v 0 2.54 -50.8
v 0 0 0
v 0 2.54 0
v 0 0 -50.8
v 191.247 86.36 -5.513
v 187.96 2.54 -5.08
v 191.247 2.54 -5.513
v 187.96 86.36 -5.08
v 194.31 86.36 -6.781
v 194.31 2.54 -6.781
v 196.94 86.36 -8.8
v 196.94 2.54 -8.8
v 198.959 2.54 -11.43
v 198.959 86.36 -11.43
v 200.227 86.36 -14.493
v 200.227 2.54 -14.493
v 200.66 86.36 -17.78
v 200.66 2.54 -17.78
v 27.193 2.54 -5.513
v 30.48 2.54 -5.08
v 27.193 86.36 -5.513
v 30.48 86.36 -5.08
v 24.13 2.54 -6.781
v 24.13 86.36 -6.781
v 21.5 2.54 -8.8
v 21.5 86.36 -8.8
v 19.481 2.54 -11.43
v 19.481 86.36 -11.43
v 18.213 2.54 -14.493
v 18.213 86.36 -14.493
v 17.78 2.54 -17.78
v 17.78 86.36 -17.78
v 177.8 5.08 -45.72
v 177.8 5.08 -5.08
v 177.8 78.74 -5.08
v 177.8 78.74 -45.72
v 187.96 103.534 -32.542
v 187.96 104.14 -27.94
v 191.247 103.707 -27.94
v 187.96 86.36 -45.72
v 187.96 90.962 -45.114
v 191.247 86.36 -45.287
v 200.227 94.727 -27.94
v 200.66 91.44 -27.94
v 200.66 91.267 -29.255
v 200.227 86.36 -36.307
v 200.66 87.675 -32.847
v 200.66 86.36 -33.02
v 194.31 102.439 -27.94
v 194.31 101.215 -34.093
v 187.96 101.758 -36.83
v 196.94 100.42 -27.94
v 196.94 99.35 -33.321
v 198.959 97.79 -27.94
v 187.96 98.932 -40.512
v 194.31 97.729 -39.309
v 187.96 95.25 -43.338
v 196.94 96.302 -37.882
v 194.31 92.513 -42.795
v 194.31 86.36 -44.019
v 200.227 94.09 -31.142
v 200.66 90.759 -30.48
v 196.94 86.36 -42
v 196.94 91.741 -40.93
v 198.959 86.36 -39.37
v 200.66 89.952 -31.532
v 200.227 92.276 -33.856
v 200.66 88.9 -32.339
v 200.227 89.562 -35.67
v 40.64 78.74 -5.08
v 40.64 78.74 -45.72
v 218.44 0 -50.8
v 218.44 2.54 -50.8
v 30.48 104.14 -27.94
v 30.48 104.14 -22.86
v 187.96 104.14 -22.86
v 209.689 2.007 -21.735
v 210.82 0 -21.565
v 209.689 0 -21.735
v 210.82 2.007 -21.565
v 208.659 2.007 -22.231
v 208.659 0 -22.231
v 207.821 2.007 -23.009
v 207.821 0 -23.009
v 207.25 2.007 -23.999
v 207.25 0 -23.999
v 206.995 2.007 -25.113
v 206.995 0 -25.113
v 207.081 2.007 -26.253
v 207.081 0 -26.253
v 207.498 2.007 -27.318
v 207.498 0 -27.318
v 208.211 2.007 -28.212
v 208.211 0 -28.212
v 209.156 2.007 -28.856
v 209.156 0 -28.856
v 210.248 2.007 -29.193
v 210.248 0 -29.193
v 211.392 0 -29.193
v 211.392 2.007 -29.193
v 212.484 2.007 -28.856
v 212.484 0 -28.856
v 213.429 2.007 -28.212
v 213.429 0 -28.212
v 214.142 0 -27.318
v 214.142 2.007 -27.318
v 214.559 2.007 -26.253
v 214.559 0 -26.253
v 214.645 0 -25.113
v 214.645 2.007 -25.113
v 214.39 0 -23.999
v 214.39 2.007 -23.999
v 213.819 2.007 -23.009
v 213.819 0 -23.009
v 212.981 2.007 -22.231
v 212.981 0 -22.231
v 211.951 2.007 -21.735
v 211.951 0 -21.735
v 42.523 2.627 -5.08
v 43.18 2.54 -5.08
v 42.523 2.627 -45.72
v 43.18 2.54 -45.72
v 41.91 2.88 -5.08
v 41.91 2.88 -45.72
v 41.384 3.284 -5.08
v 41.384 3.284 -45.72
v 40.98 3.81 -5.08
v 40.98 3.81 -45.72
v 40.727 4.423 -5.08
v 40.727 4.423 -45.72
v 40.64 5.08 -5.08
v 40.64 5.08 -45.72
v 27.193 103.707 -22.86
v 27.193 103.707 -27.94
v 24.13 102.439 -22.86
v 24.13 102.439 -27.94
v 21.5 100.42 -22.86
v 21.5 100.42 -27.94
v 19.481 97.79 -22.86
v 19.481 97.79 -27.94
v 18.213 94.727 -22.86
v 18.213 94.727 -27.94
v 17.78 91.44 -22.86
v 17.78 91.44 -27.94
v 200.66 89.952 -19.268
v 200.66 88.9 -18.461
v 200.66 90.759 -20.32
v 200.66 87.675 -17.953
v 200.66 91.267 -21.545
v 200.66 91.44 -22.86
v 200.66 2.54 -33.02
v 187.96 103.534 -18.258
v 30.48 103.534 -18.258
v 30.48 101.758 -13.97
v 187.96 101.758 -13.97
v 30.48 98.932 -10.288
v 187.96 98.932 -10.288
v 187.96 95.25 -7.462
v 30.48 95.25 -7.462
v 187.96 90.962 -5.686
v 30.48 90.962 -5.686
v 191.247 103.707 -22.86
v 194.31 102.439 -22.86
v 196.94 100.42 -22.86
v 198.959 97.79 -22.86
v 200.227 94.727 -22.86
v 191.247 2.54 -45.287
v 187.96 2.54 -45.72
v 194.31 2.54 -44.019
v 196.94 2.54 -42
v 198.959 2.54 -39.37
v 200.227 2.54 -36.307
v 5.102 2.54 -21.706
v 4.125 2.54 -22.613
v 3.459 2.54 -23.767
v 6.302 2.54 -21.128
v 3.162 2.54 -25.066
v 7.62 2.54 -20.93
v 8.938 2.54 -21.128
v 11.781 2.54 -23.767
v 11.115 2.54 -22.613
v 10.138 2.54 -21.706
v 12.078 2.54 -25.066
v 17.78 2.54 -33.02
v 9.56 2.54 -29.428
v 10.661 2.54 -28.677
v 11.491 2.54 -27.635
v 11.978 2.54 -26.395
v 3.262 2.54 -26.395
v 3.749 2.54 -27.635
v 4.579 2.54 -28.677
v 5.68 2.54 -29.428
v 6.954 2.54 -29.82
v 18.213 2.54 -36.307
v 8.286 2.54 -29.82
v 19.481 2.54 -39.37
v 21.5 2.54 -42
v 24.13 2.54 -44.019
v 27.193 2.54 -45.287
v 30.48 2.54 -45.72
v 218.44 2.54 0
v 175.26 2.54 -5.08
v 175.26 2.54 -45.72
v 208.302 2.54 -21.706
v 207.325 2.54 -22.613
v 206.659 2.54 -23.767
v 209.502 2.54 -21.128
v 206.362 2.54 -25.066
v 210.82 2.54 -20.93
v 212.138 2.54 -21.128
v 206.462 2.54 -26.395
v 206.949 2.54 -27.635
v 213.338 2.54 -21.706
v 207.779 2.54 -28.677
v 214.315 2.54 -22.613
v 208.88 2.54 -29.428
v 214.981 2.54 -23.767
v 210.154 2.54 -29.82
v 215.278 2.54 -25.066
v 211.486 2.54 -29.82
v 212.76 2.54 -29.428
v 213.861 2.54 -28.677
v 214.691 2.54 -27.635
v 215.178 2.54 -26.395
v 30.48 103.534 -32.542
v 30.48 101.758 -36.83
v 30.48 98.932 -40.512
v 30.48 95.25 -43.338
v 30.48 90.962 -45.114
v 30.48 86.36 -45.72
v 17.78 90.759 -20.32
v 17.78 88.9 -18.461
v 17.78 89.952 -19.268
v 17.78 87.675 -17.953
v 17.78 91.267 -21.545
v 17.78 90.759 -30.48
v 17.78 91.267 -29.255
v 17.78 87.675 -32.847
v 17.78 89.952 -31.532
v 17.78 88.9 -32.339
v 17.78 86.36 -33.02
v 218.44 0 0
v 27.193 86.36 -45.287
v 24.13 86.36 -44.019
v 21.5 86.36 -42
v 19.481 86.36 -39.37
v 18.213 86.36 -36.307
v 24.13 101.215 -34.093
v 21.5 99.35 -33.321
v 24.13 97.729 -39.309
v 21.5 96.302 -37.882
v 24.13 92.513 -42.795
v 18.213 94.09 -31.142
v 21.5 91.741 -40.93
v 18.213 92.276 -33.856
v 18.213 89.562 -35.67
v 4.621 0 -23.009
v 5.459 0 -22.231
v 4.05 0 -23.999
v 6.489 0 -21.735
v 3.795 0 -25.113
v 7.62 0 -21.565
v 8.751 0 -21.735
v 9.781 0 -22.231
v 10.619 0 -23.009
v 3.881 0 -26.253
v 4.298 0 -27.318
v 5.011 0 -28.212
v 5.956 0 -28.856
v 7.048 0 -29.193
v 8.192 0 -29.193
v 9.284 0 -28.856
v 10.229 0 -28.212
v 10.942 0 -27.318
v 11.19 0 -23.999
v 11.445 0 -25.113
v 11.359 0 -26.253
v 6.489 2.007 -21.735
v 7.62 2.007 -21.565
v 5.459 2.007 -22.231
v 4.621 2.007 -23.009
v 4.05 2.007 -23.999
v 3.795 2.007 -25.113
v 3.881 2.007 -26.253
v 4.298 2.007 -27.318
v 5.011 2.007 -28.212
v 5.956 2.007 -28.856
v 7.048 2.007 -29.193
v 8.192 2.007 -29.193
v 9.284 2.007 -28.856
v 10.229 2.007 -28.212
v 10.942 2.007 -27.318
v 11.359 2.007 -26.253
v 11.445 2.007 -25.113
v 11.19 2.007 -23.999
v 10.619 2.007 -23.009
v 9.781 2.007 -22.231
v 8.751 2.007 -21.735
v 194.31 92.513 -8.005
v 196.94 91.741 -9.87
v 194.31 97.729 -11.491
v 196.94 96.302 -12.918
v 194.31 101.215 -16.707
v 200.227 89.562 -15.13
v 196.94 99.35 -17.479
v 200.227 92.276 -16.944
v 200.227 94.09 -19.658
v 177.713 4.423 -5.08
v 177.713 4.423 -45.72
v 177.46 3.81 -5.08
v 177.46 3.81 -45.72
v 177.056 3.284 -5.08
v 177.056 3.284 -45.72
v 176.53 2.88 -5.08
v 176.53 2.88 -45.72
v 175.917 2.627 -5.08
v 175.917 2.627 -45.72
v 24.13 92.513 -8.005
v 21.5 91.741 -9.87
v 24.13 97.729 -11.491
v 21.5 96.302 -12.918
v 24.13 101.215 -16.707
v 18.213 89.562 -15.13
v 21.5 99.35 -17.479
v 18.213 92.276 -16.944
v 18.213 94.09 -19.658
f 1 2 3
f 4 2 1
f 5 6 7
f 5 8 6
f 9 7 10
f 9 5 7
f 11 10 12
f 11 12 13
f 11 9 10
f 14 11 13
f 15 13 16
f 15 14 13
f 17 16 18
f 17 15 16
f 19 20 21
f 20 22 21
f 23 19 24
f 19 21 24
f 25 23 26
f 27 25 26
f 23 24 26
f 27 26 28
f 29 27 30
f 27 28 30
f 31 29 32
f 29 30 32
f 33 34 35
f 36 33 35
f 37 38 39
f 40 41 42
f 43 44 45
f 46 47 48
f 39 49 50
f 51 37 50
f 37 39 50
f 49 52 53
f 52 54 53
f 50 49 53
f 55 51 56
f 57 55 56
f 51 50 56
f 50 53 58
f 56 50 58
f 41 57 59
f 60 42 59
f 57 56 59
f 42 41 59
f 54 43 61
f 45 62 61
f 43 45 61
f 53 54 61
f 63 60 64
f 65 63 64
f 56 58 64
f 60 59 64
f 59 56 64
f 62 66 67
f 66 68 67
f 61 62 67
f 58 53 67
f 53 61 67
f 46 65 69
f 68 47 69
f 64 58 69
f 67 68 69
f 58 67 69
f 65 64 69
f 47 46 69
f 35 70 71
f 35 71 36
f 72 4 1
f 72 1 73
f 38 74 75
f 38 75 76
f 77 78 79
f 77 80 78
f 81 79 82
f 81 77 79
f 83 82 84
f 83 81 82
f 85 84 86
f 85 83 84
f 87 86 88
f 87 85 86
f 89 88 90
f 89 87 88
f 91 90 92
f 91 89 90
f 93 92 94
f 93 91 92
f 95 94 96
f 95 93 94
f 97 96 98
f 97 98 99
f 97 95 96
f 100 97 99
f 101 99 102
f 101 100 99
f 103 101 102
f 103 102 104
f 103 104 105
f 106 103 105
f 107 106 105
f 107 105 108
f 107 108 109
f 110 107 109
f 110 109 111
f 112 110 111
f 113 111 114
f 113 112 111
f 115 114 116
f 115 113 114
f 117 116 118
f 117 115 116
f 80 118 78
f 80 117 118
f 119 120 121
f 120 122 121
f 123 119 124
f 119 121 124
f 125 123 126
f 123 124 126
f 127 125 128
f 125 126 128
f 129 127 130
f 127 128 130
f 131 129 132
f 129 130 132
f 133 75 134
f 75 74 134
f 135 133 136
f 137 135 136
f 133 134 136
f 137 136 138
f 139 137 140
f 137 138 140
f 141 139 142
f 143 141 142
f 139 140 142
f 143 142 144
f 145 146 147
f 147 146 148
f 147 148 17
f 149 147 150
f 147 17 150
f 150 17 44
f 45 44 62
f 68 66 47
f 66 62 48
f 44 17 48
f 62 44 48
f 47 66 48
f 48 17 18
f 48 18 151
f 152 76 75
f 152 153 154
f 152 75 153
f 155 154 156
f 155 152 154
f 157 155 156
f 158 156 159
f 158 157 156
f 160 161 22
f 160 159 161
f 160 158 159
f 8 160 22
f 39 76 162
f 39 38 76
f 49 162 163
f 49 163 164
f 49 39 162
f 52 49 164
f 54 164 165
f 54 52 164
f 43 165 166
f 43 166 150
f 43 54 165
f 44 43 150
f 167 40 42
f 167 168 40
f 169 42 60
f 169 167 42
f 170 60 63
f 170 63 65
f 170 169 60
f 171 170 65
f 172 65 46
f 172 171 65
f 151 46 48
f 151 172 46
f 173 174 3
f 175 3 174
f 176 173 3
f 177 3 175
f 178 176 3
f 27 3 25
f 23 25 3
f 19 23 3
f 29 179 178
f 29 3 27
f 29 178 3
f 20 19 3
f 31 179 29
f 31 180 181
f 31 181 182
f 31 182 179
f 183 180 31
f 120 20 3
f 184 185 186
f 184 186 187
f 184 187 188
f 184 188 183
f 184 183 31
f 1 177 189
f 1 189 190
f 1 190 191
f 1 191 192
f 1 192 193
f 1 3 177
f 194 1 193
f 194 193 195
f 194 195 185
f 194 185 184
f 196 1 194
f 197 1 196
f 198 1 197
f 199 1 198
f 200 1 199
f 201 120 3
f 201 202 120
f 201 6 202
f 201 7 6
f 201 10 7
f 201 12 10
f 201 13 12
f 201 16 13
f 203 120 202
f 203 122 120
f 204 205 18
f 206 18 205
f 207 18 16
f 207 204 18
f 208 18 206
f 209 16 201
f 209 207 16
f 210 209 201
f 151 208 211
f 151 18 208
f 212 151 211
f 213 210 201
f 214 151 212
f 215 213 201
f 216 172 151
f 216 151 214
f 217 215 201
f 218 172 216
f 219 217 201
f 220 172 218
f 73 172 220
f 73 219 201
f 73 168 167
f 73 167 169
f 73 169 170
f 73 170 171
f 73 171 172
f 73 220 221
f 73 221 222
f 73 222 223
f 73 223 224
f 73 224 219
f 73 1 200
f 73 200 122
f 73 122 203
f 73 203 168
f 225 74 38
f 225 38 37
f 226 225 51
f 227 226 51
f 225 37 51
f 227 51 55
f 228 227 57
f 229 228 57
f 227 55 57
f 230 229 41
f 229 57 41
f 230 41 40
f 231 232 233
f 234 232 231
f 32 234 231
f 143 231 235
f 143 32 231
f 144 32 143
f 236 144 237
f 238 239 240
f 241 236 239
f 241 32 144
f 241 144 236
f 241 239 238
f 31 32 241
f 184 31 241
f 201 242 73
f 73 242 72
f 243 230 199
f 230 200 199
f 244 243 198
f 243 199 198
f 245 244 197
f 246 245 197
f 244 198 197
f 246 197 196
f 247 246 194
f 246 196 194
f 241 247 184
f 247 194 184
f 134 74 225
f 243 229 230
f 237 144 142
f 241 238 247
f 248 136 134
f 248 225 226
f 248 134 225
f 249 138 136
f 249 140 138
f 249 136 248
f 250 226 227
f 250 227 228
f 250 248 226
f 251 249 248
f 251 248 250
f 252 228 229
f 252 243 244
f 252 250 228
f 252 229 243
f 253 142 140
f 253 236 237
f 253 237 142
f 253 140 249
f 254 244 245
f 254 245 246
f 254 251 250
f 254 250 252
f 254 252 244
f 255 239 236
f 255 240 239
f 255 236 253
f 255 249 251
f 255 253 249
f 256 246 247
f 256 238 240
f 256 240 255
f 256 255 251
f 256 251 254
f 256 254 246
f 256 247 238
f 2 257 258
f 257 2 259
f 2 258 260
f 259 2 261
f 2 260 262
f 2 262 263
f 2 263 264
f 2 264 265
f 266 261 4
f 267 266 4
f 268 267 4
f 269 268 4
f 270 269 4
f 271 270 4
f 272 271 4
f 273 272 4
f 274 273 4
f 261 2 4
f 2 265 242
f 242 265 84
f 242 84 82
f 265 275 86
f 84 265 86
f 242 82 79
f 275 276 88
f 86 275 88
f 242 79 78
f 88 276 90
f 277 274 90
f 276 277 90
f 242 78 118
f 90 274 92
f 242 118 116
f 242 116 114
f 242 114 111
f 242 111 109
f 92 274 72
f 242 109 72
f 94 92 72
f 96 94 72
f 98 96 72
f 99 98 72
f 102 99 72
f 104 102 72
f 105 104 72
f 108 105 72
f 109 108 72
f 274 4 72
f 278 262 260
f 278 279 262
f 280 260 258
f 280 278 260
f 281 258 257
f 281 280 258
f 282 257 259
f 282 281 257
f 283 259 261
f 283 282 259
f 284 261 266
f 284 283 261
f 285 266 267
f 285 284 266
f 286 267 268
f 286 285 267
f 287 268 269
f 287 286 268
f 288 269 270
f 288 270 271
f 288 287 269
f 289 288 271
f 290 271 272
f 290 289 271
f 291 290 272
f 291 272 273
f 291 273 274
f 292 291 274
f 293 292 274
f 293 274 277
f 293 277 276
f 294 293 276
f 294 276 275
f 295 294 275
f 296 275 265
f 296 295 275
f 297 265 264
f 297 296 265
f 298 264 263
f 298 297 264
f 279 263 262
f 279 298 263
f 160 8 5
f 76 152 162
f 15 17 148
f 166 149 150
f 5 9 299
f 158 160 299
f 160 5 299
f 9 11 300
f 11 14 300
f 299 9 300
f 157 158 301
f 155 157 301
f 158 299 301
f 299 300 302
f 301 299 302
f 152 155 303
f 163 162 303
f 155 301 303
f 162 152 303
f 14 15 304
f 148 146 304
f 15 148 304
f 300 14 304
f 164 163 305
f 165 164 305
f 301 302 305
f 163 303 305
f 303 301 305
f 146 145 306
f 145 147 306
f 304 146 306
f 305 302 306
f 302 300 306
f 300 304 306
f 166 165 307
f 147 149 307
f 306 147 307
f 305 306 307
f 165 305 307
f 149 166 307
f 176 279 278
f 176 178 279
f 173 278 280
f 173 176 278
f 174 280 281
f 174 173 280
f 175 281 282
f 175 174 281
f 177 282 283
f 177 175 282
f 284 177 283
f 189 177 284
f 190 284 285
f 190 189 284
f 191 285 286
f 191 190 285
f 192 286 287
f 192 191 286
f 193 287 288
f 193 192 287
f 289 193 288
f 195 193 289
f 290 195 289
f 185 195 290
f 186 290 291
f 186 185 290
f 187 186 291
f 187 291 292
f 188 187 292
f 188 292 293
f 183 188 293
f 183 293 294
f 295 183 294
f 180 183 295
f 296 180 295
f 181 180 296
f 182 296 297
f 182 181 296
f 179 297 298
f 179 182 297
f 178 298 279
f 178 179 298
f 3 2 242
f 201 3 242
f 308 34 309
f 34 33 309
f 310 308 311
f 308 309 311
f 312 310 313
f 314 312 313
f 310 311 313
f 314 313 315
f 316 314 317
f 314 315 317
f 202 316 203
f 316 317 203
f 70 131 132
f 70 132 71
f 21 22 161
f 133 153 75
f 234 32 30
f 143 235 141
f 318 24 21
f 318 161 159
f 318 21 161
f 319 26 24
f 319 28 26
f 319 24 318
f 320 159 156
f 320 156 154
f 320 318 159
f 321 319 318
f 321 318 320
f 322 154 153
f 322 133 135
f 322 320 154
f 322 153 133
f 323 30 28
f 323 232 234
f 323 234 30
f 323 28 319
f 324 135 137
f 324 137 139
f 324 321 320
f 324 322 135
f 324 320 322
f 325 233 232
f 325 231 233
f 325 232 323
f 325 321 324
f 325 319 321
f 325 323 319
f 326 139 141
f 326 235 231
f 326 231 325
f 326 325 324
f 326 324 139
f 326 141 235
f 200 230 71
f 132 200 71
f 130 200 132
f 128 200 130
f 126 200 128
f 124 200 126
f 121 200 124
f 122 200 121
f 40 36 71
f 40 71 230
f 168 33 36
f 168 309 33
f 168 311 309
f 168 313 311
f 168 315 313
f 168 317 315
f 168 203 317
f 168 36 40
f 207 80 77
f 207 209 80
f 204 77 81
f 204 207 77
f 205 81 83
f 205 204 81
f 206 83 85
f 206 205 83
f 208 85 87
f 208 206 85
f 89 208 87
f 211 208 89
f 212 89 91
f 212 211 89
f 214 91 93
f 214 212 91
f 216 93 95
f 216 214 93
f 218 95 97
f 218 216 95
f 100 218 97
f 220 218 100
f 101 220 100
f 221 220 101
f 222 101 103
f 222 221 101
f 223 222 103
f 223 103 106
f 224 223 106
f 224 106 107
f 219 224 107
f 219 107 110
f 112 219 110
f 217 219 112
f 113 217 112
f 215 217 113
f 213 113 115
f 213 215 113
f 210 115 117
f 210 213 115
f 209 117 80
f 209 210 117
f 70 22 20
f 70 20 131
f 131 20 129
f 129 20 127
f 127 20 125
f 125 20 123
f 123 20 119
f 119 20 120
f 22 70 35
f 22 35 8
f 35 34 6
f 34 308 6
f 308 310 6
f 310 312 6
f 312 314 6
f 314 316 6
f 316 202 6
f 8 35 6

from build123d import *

# Parameters (mm, degrees)
SKETCH2_W                         = 218.44
SKETCH2_H                         = 50.8
SKETCH2_R                         = 3.81
BOSS_EXTRUDE1_DEPTH               = 2.54
SKETCH3_W                         = 182.88
SKETCH3_H                         = 40.64
BOSS_EXTRUDE2_DEPTH               = 101.6
SKETCH5_W                         = 137.16
SKETCH5_H                         = 76.2
CUT_EXTRUDE2_DEPTH                = 101.6
FILLET1_R                         = 17.78
FILLET2_R                         = 17.78
FILLET3_R                         = 12.7
FILLET4_R                         = 12.7
FILLET5_R                         = 2.54
FILLET6_R                         = 2.54
N_0_302_DIAMETER_HOLE1_AT_2_COUNT = 2
N_0_302_DIAMETER_HOLE1_AT_2_PITCH = 203.2


with BuildPart() as part:
    # Sketch2 → Boss-Extrude1 (new body)
    with BuildSketch(Plane(origin=(0, 0, 0), x_dir=(1, 0, 0), z_dir=(0, 1, 0))):
        with Locations((109.22, 25.4)):
            Rectangle(SKETCH2_W, SKETCH2_H)
        with Locations(Location((7.62, 25.4, 0), (0, 0, 270))):
            Circle(SKETCH2_R, mode=Mode.SUBTRACT)
        with Locations(Location((210.82, 25.4, 0), (0, 0, 90))):
            Circle(SKETCH2_R, mode=Mode.SUBTRACT)
    extrude(amount=BOSS_EXTRUDE1_DEPTH)

    # Sketch3 → Boss-Extrude2 (add)
    with BuildSketch(Plane(origin=(0, 2.54, 0), x_dir=(1, 0, 0), z_dir=(0, 1, 0))):
        with Locations((109.22, 25.4)):
            Rectangle(SKETCH3_W, SKETCH3_H)
    extrude(amount=BOSS_EXTRUDE2_DEPTH)

    # Sketch5 → Cut-Extrude2 (cut)
    with BuildSketch(Plane.XY.offset(-5.08)):
        with Locations((109.22, 40.64)):
            Rectangle(SKETCH5_W, SKETCH5_H)
    extrude(amount=-CUT_EXTRUDE2_DEPTH, mode=Mode.SUBTRACT)

    # Fillet1
    fillet1_edges = [part.edges().sort_by_distance(p)[0] for p in [
        (109.22, 104.14, -5.08),
    ]]
    fillet(fillet1_edges, radius=FILLET1_R)

    # Fillet2
    fillet2_edges = [part.edges().sort_by_distance(p)[0] for p in [
        (109.22, 104.14, -45.72),
    ]]
    fillet(fillet2_edges, radius=FILLET2_R)

    # Fillet3
    fillet3_edges = [part.edges().sort_by_distance(p)[0] for p in [
        (17.78, 44.45, -5.08),
        (17.78, 98.932358569, -10.287641431),
        (17.78, 104.14, -25.4),
        (17.78, 44.45, -45.72),
        (17.78, 98.932358569, -40.512358569),
    ]]
    fillet(fillet3_edges, radius=FILLET3_R)

    # Fillet4
    fillet4_edges = [part.edges().sort_by_distance(p)[0] for p in [
        (200.66, 104.14, -25.4),
        (200.66, 44.45, -5.08),
        (200.66, 98.932358569, -10.287641431),
        (200.66, 44.45, -45.72),
        (200.66, 98.932358569, -40.512358569),
    ]]
    fillet(fillet4_edges, radius=FILLET4_R)

    # Fillet5
    fillet5_edges = [part.edges().sort_by_distance(p)[0] for p in [
        (40.64, 2.54, -25.4),
    ]]
    fillet(fillet5_edges, radius=FILLET5_R)

    # Fillet6
    fillet6_edges = [part.edges().sort_by_distance(p)[0] for p in [
        (177.8, 2.54, -25.4),
    ]]
    fillet(fillet6_edges, radius=FILLET6_R)

    # Sketch7 → N (0.302) Diameter Hole1 (revolve, cut)
    with BuildSketch(Plane(origin=(210.82, 2.54, -25.4), x_dir=(0, 0, 1), z_dir=(1, 0, 0))):
        Polygon((0, 0), (0, 2.54), (3.8354, 2.54), (3.8354, 0.532828266), (4.4704, 0), align=None)
    n_0_302_diameter_hole1 = revolve(axis=Axis((210.82, 8.89, -25.4), (0, -1, 0)), mode=Mode.SUBTRACT)

    # N (0.302) Diameter Hole1 at 2: N (0.302) Diameter Hole1 ×2
    with Locations(*[(-i * N_0_302_DIAMETER_HOLE1_AT_2_PITCH, 0, 0) for i in range(1, N_0_302_DIAMETER_HOLE1_AT_2_COUNT)]):
        add(n_0_302_diameter_hole1, mode=Mode.SUBTRACT)


solid = part.part
